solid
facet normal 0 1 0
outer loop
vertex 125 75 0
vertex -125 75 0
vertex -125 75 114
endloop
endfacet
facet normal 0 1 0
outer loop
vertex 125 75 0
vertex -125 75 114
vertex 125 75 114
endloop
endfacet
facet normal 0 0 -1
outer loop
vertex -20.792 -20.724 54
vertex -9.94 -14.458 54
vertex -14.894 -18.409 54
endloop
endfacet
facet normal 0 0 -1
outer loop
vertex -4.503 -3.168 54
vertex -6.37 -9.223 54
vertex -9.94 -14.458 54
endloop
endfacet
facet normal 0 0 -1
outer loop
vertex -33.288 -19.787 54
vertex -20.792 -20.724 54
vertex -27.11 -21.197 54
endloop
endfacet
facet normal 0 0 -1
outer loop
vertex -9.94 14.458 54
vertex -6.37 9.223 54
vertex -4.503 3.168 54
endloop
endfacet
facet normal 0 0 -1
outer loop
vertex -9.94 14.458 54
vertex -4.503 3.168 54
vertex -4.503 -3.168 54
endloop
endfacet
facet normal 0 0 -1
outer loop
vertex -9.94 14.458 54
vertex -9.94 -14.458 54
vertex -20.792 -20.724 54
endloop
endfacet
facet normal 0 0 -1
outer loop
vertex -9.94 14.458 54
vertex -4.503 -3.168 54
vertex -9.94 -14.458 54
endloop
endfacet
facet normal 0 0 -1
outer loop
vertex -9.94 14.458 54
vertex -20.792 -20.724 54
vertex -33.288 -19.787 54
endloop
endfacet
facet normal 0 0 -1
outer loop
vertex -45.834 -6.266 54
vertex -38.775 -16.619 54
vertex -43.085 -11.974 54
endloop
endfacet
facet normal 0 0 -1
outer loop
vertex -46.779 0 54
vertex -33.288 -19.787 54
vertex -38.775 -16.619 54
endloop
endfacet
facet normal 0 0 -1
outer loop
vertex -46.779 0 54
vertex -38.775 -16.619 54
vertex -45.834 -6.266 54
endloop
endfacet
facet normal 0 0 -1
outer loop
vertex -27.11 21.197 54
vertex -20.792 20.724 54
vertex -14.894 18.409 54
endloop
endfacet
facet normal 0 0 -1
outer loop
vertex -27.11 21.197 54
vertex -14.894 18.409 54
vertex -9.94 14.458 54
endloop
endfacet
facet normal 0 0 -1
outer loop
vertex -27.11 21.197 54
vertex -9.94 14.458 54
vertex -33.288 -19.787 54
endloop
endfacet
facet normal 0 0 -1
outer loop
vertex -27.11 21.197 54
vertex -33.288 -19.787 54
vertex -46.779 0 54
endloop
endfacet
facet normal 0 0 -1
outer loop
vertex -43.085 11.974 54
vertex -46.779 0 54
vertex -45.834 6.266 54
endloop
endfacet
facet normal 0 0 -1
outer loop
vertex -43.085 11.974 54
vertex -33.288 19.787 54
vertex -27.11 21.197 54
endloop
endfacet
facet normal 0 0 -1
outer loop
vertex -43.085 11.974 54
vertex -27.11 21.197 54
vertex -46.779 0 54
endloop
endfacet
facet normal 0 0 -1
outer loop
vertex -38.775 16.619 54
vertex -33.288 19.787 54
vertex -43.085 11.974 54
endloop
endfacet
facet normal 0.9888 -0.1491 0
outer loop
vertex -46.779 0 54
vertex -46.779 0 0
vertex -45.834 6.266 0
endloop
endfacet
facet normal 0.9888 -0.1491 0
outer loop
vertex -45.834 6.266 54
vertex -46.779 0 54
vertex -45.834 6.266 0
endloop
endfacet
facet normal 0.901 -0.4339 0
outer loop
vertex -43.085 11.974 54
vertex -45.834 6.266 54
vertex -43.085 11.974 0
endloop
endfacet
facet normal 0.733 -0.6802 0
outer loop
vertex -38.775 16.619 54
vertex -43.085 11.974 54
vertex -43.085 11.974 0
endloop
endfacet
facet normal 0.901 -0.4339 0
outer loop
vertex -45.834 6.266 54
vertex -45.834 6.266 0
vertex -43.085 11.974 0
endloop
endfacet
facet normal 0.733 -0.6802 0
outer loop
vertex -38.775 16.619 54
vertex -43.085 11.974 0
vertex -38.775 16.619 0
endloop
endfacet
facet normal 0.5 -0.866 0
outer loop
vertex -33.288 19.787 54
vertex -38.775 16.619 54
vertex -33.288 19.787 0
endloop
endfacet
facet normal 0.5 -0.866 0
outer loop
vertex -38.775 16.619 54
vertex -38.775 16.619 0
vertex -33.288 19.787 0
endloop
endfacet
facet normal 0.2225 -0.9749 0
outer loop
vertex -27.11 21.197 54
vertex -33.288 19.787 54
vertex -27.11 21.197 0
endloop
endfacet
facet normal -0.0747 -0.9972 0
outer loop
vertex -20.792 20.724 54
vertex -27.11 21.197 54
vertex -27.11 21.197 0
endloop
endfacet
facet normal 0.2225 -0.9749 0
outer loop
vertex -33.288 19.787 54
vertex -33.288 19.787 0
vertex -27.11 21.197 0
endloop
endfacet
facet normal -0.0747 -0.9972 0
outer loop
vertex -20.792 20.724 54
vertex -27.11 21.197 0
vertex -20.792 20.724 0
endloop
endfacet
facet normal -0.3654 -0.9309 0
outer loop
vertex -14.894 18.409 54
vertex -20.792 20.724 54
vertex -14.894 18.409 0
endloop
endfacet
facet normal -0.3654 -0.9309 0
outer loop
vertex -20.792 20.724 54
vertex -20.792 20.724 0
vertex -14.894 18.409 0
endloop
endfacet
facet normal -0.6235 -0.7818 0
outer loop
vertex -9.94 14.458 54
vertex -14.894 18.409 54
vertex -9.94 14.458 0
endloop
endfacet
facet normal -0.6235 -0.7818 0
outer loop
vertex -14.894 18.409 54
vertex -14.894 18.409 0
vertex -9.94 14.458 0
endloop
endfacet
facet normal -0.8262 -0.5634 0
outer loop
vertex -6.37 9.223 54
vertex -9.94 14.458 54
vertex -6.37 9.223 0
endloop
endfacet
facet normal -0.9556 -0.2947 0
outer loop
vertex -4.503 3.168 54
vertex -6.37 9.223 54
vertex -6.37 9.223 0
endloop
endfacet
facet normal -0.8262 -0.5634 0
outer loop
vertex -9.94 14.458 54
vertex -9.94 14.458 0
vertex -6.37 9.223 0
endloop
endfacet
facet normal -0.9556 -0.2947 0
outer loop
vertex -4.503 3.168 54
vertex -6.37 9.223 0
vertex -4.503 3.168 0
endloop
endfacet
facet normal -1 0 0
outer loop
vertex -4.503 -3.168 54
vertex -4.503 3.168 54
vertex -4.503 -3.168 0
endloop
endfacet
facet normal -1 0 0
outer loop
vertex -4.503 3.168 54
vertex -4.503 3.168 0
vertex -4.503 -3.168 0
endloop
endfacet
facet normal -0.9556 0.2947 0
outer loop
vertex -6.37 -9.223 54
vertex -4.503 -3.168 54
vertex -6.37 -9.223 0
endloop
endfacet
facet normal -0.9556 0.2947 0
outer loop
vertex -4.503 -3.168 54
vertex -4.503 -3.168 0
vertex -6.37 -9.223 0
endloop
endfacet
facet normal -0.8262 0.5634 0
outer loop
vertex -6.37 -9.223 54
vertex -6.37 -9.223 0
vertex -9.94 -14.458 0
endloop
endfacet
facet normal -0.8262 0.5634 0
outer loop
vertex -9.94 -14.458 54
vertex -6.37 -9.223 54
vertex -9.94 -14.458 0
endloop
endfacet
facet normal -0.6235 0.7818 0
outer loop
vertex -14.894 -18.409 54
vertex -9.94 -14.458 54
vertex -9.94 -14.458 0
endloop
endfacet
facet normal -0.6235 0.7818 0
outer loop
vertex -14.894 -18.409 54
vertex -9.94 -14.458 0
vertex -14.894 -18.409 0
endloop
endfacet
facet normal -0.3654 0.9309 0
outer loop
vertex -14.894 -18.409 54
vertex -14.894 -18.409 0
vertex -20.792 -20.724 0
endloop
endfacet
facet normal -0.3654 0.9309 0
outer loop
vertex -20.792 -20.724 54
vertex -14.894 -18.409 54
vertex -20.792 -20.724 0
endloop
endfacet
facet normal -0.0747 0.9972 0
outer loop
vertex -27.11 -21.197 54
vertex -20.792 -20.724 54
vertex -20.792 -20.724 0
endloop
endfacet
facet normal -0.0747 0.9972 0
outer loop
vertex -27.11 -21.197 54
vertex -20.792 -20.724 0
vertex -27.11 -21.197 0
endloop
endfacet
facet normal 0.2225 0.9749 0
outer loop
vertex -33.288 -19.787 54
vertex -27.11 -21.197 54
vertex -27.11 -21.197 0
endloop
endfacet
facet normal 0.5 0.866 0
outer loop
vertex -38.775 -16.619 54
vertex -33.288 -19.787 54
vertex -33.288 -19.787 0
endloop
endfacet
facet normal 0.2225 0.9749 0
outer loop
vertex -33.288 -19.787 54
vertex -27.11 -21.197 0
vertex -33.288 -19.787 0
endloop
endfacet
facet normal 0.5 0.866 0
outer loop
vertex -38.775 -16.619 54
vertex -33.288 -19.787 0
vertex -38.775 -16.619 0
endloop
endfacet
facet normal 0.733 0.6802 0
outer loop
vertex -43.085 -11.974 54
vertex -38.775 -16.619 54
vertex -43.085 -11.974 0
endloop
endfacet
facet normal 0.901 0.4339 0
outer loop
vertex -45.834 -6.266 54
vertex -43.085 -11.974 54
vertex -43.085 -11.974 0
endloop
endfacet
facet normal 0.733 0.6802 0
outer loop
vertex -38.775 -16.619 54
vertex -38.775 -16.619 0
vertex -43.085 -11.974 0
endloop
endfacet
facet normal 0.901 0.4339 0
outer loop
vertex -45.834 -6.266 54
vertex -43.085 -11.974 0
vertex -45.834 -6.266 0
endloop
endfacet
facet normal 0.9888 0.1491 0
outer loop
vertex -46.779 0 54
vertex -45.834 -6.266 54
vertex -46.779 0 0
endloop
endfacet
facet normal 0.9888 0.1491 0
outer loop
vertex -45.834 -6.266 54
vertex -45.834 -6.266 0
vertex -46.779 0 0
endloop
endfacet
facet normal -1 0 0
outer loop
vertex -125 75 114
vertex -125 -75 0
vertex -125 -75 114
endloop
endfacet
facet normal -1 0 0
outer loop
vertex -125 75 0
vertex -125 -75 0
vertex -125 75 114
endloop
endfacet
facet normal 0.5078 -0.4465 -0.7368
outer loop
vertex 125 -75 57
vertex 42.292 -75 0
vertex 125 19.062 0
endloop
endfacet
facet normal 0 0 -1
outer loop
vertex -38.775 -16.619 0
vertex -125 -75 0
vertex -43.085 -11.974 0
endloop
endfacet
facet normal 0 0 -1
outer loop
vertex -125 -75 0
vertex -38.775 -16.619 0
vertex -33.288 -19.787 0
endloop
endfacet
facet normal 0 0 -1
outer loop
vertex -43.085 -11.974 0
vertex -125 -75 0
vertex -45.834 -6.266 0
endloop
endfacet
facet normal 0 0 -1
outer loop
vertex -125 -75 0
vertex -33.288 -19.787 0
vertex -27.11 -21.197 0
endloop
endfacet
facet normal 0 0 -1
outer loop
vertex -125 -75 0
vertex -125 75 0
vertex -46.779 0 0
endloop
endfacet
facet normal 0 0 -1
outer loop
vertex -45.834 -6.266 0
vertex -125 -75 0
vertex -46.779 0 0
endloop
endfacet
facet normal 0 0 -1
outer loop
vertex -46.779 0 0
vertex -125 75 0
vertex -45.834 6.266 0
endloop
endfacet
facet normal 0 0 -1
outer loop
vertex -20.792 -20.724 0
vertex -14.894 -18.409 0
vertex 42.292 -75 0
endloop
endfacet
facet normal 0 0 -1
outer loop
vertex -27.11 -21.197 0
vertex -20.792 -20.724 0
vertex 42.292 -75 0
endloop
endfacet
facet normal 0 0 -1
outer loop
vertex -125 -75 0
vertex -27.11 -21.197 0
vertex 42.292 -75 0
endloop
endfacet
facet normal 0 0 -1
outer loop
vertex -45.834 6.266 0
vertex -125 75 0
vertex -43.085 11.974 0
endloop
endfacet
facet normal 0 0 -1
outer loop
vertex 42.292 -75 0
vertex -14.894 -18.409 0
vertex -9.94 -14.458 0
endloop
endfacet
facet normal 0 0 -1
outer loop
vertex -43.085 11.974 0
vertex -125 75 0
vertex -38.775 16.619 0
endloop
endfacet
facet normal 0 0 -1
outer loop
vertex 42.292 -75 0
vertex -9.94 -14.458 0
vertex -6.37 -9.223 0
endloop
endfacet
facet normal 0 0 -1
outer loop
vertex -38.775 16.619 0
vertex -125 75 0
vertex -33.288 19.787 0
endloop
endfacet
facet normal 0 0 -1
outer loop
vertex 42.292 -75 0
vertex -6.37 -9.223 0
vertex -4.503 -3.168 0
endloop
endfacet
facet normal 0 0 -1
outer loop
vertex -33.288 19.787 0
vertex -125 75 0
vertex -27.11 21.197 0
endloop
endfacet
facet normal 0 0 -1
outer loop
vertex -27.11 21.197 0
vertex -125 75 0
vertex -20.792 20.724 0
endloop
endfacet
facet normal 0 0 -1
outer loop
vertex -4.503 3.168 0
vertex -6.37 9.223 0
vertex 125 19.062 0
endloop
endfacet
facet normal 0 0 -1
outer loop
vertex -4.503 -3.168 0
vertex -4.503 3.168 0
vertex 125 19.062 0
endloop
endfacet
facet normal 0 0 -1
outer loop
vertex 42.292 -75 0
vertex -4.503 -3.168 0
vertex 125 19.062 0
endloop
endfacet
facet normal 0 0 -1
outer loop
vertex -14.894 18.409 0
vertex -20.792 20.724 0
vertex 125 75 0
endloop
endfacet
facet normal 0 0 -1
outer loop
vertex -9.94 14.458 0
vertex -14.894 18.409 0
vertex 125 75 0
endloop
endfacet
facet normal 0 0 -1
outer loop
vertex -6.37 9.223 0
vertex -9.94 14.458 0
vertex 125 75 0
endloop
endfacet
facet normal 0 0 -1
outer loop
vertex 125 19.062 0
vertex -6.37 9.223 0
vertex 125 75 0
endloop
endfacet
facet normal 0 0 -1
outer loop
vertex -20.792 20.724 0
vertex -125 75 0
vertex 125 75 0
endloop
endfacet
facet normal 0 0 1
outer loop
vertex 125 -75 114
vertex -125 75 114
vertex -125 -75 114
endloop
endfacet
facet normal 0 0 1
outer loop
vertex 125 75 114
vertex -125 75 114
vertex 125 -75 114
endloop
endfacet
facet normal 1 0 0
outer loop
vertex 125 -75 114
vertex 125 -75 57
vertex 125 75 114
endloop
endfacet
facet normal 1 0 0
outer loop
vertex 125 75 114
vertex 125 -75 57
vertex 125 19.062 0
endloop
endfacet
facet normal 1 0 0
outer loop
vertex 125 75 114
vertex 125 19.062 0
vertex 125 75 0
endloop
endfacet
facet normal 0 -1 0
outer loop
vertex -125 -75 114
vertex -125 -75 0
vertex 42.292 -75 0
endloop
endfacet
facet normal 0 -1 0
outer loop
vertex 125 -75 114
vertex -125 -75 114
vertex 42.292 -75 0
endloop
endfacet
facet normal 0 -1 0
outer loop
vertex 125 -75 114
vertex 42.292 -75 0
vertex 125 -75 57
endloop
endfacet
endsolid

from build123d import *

# Parameters (mm, degrees)
SKETCH1_W           = 250
SKETCH1_H           = 150
BOSS_EXTRUDE1_DEPTH = 114
SKETCH4_W           = 158.825989779
SKETCH4_H           = 169.09880145
CUT_EXTRUDE1_DEPTH  = 114
SKETCH5_R           = 21.25669472
CUT_EXTRUDE2_DEPTH  = 54


with BuildPart() as part:
    # Sketch1 → Boss-Extrude1 (new body)
    with BuildSketch(Plane.XY):
        Rectangle(SKETCH1_W, SKETCH1_H)
    extrude(amount=BOSS_EXTRUDE1_DEPTH)

    # Sketch4 → Cut-Extrude1 (cut)
    with BuildSketch(Plane(origin=(27.906934923, -24.538252492, -40.49320945), x_dir=(0.8614948455361232, 0.2631519435385569, 0.4342553231988889), z_dir=(-0.5077663154588844, 0.4464731827403718, 0.7367734156299286))):
        with Locations((63.082324951, -59.282681283)):
            Rectangle(SKETCH4_W, SKETCH4_H)
    extrude(amount=-CUT_EXTRUDE1_DEPTH, mode=Mode.SUBTRACT)

    # Sketch5 → Cut-Extrude2 (cut)
    with BuildSketch(Plane(origin=(0, 0, 0), x_dir=(-1, 0, 0), z_dir=(0, 0, -1))):
        with Locations((25.521911399, 0)):
            Circle(SKETCH5_R)
    extrude(amount=-CUT_EXTRUDE2_DEPTH, mode=Mode.SUBTRACT)


solid = part.part
